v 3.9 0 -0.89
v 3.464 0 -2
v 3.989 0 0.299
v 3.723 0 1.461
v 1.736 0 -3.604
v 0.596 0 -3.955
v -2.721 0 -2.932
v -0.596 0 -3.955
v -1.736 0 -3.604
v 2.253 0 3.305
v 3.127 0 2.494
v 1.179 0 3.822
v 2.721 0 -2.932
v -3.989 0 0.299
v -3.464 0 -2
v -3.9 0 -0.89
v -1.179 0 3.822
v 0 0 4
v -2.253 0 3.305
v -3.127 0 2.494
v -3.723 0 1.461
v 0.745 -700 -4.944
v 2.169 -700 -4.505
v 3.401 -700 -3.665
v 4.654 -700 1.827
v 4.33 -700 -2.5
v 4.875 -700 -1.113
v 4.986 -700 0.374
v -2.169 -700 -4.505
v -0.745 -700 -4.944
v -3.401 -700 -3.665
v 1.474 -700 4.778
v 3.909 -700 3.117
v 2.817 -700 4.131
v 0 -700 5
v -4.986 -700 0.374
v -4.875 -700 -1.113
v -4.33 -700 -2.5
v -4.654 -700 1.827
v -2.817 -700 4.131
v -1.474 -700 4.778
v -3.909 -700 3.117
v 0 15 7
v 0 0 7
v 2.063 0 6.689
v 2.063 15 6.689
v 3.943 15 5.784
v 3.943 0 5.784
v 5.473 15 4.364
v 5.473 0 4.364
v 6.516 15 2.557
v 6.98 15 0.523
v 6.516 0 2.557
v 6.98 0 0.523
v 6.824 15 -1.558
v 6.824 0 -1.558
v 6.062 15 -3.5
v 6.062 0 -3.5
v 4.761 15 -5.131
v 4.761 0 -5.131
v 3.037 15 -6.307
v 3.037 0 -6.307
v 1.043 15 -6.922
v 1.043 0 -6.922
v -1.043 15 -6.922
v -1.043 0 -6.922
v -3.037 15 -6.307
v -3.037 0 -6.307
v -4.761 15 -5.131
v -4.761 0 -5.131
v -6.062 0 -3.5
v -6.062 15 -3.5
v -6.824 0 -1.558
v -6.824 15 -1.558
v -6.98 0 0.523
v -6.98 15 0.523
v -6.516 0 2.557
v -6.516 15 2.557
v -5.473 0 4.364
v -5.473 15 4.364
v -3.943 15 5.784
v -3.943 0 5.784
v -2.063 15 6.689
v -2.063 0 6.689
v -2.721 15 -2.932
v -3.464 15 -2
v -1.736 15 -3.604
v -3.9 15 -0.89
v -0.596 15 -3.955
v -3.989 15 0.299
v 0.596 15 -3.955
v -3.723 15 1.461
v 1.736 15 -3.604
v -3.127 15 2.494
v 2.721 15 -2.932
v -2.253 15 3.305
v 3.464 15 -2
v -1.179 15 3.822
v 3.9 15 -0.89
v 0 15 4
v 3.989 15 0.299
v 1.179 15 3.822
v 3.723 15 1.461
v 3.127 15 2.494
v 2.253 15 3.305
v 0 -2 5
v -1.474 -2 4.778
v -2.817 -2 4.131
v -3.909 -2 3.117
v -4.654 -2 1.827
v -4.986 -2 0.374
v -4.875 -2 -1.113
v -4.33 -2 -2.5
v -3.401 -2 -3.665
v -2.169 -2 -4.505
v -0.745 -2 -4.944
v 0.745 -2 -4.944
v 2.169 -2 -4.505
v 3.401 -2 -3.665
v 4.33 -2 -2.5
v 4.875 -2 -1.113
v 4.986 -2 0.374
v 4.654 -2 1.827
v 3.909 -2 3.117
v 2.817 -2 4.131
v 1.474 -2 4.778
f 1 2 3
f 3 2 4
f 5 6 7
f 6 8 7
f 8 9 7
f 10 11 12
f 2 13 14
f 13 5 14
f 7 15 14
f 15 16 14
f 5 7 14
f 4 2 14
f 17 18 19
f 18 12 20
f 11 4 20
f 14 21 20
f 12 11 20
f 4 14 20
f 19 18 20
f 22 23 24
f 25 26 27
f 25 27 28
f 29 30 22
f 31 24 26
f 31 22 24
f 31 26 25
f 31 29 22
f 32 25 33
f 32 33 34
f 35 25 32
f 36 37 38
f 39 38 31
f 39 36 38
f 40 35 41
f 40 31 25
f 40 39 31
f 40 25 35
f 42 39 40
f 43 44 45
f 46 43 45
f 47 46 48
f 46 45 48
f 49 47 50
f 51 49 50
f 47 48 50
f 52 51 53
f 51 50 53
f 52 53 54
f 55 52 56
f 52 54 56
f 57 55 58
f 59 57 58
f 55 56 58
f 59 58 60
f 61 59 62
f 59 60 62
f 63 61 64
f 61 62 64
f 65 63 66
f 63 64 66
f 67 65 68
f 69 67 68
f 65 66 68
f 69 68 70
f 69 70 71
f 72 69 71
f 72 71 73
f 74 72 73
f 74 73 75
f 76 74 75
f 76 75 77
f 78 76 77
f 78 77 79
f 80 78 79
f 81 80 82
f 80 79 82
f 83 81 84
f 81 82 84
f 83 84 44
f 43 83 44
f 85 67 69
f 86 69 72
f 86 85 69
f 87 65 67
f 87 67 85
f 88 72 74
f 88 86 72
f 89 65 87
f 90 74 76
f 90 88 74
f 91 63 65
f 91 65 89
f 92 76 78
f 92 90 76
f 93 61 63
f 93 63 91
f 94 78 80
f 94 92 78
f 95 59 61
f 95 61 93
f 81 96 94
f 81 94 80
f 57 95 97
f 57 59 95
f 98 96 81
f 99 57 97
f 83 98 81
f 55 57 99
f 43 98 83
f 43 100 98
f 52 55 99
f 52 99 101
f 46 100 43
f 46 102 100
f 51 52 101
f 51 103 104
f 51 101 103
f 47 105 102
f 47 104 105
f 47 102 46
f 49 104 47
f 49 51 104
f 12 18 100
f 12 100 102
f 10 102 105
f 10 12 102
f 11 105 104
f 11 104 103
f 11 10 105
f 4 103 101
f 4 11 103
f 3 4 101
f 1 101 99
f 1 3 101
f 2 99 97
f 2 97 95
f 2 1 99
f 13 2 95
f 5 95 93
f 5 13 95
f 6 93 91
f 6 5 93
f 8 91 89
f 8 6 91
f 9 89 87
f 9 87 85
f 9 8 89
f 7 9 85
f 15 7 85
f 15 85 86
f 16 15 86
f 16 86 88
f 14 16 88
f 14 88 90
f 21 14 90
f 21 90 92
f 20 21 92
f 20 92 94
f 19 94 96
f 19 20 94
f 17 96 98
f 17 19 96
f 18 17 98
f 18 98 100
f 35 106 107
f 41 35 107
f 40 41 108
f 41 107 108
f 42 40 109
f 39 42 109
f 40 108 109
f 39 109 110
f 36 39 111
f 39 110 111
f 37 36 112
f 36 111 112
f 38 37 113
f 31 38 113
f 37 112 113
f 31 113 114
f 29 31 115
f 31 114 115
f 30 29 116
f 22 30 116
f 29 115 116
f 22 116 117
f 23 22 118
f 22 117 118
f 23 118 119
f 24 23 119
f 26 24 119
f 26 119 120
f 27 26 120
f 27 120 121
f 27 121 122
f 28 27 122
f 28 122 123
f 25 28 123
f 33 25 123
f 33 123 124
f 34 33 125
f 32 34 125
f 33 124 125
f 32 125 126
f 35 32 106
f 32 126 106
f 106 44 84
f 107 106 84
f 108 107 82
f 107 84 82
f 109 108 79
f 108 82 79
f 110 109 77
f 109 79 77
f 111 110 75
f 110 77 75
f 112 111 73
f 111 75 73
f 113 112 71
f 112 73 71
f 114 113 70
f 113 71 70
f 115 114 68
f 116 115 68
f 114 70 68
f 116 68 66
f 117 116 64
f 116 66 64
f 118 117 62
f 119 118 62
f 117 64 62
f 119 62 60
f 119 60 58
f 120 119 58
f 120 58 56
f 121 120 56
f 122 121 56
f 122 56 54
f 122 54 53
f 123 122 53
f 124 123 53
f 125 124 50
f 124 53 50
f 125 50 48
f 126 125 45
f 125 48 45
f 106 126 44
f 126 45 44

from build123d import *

# Parameters (mm, degrees)
SKETCH1_R           = 7
SKETCH1_R_2         = 4
BOSS_EXTRUDE1_DEPTH = 15
SKETCH2_R           = 5
BOSS_EXTRUDE2_DEPTH = 700
CHAMFER1_SIZE       = 2


with BuildPart() as part:
    # Sketch1 → Boss-Extrude1 (new body)
    with BuildSketch(Plane(origin=(0, 0, 0), x_dir=(1, 0, 0), z_dir=(0, 1, 0))):
        with Locations(Location((0, 0, 0), (0, 0, 270))):
            Circle(SKETCH1_R)
        with Locations(Location((0, 0, 0), (0, 0, 270))):
            Circle(SKETCH1_R_2, mode=Mode.SUBTRACT)
    extrude(amount=BOSS_EXTRUDE1_DEPTH)

    # Sketch2 → Boss-Extrude2 (add)
    with BuildSketch(Plane.XZ):
        with Locations(Location((0, 0, 0), (0, 0, 90))):
            Circle(SKETCH2_R)
    extrude(amount=BOSS_EXTRUDE2_DEPTH)

    # Chamfer1
    chamfer1_edges = [part.edges().sort_by_distance(p)[0] for p in [
        (0, 0, -5),
    ]]
    chamfer(chamfer1_edges, length=CHAMFER1_SIZE - 0.0001)  # a hair under: the kernel refuses the full size


solid = part.part
